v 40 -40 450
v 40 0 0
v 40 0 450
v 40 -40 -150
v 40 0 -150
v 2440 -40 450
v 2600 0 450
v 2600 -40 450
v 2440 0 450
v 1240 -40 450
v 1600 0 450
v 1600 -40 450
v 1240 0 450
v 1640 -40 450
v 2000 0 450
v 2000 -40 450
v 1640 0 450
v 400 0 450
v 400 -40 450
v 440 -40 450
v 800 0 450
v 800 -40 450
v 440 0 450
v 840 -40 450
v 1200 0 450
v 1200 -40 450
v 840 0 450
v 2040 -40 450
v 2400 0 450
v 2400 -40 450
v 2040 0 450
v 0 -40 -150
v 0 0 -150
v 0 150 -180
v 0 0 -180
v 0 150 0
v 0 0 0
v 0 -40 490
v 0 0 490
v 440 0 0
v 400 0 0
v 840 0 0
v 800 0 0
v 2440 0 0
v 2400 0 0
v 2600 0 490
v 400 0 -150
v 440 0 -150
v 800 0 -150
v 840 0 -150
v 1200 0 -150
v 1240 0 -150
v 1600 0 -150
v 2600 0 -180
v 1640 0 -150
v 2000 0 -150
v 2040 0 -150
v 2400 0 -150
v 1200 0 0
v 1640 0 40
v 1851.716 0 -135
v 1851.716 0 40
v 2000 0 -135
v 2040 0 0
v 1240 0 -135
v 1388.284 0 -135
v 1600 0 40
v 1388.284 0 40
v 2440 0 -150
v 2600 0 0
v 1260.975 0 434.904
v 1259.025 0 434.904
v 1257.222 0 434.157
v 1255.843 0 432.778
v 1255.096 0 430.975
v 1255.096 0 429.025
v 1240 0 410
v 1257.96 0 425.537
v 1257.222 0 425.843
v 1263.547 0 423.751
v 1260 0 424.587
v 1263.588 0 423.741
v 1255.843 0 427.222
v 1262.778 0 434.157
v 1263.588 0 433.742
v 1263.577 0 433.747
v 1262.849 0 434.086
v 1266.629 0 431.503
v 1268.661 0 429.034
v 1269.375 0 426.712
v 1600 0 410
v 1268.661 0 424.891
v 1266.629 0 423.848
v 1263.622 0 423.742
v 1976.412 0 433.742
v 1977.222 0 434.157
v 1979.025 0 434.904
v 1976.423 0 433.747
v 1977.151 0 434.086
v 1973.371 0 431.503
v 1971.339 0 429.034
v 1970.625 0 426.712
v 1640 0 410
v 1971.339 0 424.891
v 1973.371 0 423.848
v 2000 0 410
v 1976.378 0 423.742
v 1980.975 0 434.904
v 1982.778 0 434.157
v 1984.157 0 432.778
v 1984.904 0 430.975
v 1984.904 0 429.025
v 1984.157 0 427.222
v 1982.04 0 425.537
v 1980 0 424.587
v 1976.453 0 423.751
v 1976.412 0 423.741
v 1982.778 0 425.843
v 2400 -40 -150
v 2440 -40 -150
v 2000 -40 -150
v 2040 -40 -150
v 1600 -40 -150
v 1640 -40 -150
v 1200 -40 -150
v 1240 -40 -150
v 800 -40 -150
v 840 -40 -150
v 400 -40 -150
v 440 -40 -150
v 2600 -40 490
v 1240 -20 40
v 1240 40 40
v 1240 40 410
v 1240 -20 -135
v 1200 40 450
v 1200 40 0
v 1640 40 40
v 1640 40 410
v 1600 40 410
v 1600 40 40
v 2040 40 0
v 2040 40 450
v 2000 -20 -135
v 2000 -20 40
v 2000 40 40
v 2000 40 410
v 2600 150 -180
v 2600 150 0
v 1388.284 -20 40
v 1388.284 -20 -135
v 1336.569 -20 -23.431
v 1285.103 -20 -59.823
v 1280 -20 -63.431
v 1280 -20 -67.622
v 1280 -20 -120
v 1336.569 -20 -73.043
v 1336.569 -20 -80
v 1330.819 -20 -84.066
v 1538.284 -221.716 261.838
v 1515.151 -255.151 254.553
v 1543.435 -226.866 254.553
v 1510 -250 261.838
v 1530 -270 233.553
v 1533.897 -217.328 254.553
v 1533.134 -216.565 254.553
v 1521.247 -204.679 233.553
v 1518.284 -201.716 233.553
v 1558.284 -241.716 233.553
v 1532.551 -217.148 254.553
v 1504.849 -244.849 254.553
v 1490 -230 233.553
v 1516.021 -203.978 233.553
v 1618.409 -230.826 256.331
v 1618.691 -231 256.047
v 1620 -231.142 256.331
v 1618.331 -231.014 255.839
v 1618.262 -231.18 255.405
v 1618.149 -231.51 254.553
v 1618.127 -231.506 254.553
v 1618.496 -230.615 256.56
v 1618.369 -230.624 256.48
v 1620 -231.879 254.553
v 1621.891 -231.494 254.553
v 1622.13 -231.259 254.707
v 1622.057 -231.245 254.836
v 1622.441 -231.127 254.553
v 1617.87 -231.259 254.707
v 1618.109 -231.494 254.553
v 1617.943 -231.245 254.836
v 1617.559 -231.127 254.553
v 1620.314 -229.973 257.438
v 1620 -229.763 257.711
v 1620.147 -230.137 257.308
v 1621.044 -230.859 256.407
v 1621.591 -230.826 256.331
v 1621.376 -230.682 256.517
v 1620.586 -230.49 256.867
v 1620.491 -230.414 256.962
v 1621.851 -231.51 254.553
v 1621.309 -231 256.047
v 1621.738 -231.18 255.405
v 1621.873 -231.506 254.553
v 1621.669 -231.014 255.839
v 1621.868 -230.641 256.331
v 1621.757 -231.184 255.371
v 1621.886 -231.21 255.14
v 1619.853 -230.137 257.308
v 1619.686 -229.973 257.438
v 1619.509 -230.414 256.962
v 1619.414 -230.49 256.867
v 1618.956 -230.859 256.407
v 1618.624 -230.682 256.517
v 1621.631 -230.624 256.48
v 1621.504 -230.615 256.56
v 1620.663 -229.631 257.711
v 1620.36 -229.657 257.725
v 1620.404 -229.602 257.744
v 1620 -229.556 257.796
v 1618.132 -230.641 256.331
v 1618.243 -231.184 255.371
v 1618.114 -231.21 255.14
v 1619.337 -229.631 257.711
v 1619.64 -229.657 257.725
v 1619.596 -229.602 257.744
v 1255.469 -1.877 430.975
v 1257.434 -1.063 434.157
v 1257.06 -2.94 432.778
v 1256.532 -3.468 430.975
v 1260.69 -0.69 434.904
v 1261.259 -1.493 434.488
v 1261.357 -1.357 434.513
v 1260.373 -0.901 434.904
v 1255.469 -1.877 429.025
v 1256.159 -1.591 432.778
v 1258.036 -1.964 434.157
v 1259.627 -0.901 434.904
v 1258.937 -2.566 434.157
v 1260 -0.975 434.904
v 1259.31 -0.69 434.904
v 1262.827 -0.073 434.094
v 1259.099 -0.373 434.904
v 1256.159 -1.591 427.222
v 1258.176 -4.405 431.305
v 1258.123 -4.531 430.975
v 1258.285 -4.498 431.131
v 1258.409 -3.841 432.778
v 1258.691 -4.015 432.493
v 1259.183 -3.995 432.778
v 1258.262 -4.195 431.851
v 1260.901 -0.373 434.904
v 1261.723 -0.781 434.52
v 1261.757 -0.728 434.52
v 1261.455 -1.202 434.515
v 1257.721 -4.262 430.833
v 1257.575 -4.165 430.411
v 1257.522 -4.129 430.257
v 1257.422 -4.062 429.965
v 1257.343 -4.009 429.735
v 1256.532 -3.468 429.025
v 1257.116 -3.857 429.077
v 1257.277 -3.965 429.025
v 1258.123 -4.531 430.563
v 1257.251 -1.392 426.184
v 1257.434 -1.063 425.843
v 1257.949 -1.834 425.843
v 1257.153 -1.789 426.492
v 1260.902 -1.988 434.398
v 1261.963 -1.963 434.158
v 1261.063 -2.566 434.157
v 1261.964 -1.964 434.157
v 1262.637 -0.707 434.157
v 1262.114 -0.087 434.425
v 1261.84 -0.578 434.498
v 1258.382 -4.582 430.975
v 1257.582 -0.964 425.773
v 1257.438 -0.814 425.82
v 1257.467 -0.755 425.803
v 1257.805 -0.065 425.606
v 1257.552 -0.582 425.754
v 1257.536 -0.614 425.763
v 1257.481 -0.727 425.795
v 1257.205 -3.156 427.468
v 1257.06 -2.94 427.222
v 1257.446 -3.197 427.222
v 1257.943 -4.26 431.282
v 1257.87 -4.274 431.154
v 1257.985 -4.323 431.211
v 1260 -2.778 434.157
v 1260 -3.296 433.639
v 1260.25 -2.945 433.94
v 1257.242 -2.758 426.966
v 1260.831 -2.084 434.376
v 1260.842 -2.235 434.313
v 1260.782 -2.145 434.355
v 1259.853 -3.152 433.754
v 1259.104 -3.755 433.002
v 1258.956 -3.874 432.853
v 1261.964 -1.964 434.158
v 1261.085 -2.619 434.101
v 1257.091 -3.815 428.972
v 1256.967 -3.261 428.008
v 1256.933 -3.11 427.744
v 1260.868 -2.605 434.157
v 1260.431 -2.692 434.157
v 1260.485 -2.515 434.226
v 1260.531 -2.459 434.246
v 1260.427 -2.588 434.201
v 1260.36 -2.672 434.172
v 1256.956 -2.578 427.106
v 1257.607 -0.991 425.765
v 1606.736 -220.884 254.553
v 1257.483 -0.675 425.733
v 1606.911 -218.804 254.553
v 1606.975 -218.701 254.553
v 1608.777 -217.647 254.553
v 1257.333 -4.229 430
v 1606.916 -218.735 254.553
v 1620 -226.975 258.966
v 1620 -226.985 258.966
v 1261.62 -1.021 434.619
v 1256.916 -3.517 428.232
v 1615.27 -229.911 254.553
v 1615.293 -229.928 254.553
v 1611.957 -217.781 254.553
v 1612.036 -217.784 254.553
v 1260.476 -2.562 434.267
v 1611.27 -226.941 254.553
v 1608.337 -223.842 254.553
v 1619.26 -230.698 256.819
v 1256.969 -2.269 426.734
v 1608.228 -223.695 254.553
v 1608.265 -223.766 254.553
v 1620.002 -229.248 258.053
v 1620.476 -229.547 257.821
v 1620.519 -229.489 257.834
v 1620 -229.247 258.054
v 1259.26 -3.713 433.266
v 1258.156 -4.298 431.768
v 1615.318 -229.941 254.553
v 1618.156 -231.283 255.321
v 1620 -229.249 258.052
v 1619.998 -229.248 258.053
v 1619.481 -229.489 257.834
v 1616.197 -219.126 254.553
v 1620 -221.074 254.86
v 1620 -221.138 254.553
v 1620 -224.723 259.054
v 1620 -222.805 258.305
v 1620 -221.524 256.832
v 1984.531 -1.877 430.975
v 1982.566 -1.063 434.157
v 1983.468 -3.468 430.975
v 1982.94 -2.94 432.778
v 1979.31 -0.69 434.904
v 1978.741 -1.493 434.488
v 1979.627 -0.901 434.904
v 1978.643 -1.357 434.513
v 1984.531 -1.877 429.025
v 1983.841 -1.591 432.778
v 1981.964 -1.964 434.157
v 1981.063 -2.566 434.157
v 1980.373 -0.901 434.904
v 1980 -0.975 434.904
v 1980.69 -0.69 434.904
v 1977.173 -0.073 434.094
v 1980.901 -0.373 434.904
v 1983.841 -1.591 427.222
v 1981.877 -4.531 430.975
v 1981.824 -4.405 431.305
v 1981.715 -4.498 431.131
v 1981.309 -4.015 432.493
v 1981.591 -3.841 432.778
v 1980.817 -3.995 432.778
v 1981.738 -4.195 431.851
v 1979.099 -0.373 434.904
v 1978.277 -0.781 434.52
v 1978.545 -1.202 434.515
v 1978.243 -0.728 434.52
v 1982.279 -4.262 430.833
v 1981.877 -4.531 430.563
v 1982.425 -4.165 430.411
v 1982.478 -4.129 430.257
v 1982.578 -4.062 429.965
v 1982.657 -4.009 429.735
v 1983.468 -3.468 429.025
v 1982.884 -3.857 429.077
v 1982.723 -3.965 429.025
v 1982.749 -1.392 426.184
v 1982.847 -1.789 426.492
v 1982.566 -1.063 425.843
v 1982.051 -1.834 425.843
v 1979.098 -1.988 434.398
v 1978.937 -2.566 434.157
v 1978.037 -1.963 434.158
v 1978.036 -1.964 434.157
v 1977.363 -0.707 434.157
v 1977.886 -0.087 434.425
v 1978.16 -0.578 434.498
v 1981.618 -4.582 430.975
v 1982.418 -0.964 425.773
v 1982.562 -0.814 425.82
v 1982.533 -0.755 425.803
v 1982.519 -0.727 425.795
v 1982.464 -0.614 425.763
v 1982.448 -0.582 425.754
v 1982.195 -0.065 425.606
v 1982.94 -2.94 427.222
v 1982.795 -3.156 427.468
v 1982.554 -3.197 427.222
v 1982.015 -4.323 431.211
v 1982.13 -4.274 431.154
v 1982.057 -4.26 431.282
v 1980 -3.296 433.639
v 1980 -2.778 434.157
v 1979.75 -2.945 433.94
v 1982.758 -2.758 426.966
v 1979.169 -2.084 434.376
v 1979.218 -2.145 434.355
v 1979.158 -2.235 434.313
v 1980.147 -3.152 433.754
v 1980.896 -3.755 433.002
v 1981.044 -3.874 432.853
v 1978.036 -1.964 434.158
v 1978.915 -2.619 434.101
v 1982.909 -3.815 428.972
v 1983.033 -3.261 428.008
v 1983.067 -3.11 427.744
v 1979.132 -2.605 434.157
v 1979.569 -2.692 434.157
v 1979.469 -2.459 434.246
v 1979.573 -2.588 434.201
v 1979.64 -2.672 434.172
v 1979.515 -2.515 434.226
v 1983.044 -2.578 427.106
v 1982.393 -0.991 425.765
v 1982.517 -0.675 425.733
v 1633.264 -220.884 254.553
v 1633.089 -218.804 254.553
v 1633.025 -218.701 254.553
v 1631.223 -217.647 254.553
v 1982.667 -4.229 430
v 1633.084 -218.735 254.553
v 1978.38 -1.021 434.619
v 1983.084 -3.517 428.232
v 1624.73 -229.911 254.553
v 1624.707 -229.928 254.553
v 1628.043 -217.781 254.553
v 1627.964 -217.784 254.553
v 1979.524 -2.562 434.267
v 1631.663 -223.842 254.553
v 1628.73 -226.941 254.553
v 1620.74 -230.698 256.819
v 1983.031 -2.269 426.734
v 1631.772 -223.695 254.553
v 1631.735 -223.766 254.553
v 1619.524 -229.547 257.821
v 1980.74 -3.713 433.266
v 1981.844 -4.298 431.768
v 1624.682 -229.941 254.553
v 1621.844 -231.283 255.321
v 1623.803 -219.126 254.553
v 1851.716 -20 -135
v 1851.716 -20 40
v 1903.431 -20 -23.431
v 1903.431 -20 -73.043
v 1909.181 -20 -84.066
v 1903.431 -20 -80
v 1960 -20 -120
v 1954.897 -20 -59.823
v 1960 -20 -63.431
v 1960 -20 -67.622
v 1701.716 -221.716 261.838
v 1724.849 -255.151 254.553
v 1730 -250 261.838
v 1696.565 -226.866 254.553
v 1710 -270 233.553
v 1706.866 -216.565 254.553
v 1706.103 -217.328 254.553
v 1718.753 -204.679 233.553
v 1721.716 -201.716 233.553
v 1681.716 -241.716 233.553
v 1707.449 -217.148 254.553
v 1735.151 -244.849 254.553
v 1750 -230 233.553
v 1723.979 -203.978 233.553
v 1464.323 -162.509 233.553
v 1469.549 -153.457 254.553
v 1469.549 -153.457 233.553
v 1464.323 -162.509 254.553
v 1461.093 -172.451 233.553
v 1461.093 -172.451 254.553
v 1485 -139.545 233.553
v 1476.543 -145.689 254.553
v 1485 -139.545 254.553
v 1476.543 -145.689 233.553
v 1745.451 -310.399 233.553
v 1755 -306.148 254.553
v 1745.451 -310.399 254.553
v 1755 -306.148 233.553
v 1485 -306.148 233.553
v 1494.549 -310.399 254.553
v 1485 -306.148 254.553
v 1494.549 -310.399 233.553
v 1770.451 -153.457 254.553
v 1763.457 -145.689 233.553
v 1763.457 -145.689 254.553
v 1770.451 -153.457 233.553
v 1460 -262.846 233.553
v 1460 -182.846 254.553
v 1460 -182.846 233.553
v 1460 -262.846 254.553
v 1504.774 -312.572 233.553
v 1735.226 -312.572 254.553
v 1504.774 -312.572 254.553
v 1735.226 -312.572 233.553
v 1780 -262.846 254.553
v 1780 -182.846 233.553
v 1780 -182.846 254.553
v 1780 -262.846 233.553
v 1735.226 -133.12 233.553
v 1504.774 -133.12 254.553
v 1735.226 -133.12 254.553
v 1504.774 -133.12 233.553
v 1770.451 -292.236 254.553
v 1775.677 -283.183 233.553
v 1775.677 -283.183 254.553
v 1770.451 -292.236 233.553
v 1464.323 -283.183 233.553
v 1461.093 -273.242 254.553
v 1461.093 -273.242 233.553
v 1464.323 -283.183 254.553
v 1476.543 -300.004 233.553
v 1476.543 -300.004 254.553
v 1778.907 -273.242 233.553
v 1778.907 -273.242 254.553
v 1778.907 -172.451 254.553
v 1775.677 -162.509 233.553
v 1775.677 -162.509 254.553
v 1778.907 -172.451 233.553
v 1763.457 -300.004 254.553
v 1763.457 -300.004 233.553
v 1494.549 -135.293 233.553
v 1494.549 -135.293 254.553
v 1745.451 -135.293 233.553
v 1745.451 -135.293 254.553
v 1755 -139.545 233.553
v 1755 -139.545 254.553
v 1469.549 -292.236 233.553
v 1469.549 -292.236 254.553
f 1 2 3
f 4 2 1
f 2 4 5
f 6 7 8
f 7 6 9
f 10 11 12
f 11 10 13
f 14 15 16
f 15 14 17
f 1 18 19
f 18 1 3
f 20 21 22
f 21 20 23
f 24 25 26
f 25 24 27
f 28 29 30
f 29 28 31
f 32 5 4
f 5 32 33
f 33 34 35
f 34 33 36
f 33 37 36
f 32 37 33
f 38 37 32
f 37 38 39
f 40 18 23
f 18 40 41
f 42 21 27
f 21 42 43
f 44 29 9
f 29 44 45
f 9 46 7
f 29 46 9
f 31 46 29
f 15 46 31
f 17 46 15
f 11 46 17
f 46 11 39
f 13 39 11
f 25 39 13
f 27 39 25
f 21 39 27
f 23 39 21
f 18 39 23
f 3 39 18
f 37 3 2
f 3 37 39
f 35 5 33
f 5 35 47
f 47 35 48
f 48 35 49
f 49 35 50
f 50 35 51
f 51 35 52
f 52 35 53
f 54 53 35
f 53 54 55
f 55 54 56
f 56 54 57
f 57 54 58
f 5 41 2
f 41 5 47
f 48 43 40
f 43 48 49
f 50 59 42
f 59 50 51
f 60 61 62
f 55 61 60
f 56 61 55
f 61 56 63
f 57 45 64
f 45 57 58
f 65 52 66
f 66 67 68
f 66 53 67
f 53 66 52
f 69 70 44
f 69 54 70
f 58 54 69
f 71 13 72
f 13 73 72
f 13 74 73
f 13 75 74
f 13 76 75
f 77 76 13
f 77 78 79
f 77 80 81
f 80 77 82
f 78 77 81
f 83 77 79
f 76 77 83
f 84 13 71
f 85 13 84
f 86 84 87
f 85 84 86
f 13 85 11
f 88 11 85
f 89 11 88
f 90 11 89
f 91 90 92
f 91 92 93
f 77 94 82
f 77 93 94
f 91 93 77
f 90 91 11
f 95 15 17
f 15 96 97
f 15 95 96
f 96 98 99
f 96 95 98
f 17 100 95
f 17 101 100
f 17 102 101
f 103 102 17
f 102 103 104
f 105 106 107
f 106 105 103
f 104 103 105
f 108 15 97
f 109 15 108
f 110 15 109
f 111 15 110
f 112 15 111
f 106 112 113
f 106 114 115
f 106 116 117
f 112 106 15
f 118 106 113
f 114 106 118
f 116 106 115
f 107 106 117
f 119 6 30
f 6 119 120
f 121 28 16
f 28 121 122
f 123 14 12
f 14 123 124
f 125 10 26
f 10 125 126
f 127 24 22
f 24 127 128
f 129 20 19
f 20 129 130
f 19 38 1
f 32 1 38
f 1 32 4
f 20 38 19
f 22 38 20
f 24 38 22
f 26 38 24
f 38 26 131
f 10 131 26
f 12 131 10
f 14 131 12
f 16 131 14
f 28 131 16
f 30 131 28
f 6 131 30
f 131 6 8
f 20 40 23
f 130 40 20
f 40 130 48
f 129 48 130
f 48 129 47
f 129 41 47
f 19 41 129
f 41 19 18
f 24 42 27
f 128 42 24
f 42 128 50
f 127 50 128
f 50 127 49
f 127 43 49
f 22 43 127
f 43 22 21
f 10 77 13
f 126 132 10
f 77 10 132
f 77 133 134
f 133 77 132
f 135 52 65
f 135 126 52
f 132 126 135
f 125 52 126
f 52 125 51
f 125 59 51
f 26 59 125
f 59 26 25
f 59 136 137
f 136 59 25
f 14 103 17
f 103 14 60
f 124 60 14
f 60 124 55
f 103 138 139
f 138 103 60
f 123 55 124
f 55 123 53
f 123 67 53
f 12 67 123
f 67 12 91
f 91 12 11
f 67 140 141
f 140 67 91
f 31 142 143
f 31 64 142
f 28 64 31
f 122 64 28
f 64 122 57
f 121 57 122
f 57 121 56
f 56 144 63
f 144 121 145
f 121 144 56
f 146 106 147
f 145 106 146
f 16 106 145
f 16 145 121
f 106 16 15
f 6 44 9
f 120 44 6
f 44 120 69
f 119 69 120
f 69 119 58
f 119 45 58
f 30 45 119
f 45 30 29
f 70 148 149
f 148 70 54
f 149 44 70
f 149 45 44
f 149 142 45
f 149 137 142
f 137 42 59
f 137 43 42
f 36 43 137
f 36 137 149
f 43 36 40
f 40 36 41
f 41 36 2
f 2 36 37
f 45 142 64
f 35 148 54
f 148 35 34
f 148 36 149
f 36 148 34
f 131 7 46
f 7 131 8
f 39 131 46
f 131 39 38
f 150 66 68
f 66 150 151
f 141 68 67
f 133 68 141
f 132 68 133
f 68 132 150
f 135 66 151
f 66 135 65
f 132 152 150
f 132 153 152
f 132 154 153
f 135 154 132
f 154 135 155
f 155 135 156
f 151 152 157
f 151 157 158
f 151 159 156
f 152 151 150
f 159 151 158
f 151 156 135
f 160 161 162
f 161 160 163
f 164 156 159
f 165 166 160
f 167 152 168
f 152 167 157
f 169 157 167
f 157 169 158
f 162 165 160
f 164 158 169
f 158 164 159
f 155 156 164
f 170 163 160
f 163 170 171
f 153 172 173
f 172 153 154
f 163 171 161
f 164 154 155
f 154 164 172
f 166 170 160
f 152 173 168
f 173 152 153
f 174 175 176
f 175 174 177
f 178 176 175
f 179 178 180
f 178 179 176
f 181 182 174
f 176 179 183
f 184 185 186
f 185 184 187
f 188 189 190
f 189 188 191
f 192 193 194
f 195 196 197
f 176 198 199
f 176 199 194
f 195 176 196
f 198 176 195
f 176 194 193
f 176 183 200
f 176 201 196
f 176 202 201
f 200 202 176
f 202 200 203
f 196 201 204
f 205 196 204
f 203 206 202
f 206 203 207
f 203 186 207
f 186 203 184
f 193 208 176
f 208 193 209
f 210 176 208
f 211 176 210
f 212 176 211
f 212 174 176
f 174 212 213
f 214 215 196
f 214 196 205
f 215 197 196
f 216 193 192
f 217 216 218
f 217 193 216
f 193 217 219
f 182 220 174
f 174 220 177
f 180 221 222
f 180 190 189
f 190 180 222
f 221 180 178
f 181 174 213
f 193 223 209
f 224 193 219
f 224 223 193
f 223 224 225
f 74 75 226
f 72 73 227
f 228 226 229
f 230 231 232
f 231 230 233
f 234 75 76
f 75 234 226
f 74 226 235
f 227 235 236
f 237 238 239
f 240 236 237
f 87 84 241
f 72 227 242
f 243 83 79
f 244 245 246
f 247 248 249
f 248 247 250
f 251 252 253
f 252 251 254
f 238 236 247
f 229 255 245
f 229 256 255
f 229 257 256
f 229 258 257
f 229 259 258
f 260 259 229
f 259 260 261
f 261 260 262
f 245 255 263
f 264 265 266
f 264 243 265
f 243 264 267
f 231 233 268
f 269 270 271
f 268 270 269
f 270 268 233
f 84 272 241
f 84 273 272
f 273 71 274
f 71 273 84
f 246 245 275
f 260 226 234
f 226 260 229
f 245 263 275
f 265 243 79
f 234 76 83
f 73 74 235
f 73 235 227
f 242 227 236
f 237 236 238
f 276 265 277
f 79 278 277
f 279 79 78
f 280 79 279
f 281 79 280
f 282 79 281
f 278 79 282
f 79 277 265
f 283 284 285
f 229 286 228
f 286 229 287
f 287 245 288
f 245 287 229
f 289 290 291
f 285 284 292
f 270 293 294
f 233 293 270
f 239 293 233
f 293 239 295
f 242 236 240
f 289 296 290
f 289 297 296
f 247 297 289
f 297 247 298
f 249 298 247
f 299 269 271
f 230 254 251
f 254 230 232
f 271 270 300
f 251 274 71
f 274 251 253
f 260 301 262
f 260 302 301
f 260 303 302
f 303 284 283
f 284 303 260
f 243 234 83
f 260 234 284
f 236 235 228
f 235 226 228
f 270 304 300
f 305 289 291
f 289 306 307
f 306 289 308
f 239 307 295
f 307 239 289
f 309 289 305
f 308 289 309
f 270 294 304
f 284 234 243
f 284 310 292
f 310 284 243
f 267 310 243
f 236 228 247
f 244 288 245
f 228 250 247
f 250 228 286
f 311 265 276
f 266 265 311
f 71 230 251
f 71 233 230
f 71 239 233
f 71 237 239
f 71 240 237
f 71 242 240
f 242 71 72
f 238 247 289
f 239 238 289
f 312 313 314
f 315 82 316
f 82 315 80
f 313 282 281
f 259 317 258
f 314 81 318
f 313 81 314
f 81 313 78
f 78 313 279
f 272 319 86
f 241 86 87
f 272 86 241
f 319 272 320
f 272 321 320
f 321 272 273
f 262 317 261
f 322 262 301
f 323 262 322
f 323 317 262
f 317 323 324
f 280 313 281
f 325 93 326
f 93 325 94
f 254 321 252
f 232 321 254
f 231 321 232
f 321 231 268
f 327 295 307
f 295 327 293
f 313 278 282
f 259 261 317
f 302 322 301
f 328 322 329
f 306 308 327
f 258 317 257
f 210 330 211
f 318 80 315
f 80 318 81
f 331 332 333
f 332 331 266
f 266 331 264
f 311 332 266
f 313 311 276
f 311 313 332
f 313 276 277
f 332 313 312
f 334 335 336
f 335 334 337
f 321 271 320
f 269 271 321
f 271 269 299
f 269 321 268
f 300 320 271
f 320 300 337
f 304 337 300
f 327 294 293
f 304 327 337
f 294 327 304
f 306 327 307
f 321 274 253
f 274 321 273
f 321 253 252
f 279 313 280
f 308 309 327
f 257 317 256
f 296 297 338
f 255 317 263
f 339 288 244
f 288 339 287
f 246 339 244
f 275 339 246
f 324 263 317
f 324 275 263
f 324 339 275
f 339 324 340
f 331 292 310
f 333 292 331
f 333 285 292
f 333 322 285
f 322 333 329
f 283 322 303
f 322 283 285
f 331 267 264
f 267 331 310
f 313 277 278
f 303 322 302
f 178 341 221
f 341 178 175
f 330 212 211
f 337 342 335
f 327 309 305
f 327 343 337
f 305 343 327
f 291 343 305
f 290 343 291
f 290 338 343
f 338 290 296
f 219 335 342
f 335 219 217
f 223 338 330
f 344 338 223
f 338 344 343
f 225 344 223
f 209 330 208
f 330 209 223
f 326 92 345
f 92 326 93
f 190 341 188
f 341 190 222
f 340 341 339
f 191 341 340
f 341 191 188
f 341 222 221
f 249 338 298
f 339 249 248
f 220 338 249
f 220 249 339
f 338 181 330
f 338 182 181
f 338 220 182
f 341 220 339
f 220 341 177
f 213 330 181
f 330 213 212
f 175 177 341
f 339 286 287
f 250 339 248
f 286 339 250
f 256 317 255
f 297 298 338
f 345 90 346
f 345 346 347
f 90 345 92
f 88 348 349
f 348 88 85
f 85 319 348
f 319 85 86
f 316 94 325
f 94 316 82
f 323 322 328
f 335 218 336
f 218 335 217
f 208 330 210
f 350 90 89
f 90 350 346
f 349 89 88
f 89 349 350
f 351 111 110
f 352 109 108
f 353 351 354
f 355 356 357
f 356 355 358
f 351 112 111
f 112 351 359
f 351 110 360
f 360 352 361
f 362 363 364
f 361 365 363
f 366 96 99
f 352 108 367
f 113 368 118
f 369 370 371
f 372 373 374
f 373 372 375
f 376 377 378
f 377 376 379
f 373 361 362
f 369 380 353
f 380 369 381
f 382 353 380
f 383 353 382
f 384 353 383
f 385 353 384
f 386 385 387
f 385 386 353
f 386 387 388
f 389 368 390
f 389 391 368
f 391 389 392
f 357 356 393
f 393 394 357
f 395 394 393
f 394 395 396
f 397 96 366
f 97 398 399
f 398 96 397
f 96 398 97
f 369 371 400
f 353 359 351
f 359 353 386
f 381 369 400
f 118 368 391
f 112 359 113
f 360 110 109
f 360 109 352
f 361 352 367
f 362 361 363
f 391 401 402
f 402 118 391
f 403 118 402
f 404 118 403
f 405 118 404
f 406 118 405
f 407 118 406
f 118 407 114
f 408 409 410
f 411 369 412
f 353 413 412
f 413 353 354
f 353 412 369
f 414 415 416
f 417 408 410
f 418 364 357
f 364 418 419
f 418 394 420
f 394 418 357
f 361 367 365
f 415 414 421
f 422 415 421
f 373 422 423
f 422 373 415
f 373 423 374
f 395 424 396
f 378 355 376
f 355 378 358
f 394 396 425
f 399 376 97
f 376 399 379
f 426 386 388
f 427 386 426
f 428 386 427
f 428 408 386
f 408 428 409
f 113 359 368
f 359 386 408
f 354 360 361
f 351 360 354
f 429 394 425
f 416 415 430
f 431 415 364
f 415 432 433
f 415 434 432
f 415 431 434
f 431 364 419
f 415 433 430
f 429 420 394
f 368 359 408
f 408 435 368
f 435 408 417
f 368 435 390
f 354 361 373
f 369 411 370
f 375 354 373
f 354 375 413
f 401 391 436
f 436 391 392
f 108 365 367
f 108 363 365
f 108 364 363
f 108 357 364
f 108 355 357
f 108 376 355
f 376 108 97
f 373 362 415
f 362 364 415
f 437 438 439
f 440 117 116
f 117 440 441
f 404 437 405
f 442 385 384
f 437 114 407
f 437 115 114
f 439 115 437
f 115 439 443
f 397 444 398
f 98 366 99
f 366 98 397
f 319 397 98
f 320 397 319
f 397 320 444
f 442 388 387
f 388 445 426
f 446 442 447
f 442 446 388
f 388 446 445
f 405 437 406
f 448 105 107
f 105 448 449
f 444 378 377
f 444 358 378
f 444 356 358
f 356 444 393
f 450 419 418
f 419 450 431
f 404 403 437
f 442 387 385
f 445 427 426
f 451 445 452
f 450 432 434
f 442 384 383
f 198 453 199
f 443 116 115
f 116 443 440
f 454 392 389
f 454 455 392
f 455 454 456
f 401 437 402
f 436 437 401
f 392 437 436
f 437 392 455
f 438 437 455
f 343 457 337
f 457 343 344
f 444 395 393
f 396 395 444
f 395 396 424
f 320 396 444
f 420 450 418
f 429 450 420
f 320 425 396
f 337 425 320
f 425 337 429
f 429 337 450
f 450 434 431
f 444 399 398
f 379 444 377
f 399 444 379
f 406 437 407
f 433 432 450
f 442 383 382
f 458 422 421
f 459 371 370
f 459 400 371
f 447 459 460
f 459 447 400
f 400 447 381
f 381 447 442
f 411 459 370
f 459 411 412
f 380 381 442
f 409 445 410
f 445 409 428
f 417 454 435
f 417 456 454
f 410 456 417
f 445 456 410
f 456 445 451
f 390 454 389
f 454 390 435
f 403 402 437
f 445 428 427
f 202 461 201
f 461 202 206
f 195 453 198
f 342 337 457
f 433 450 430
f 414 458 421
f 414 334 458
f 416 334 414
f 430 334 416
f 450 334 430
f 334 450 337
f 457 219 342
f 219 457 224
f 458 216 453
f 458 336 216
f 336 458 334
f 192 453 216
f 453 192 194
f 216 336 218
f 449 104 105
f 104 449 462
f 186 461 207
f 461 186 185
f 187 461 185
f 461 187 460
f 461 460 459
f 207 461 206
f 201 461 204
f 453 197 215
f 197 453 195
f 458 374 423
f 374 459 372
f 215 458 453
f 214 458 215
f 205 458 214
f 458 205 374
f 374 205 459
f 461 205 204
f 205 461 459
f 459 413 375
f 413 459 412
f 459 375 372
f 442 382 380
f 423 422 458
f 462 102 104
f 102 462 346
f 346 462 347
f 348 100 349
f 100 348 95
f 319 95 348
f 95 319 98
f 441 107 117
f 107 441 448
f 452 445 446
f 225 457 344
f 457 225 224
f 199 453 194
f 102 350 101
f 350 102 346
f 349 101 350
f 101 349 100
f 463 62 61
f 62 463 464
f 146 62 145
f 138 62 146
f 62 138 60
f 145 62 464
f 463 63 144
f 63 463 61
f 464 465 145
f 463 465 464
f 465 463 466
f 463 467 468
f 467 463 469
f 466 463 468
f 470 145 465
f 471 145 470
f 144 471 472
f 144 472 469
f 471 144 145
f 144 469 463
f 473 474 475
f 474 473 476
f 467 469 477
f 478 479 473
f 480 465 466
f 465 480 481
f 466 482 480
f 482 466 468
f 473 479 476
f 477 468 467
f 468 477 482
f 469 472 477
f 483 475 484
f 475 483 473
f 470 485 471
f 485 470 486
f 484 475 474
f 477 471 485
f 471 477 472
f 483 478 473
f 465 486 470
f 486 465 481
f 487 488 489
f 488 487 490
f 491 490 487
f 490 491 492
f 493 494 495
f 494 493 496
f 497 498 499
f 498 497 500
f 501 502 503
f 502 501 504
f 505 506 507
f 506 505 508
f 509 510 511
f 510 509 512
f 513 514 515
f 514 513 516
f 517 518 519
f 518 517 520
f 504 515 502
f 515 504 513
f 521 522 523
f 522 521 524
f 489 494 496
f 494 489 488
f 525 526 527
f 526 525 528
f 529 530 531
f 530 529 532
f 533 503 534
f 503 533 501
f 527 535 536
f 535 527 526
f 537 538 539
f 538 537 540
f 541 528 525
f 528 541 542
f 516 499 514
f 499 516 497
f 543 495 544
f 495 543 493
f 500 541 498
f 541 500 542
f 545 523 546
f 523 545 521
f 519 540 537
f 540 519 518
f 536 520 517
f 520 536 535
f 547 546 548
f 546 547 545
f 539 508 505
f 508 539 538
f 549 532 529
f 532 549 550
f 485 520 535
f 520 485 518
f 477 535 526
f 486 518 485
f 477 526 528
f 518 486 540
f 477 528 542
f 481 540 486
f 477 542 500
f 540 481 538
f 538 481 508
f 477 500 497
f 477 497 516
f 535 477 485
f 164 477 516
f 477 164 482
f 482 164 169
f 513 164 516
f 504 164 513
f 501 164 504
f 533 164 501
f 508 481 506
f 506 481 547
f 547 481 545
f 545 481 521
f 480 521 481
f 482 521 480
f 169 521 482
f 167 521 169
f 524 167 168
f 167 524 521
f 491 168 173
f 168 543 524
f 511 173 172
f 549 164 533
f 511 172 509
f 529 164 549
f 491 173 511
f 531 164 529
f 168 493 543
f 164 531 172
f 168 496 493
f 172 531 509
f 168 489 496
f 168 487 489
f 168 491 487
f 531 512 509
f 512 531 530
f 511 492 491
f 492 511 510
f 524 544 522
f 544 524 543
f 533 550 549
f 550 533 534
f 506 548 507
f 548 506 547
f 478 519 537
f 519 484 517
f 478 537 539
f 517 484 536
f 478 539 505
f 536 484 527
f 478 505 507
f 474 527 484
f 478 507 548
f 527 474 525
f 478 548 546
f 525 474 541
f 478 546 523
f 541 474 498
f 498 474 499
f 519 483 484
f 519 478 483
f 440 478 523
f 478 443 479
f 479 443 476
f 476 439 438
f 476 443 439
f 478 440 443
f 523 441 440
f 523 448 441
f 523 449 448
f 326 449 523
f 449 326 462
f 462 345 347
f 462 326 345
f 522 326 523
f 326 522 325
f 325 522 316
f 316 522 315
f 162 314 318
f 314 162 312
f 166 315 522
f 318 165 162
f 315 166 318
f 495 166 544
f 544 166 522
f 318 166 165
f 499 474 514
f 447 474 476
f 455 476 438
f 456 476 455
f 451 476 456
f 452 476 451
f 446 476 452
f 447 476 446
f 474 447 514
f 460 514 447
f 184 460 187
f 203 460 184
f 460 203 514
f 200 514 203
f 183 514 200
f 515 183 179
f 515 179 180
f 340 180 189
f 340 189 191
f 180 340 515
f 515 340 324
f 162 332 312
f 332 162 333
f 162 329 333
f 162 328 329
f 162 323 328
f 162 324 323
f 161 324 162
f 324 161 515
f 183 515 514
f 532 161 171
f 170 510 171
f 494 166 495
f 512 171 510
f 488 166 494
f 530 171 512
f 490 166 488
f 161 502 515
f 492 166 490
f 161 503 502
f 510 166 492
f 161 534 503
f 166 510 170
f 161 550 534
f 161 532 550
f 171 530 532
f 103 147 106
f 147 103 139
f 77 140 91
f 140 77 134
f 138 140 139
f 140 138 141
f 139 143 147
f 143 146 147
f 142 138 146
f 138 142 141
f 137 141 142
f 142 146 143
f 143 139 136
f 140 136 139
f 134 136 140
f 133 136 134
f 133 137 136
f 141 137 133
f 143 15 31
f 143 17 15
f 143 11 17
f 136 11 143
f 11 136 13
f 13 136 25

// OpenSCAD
galeria_tarto_szama = 6 ;
galeria_tarto_szelessege = 40 ; 
galeria_tarto_vastassaga = 40 ; 
galeria_tarto_magassaga = 600 ; 
galeria_tarto_arasz = 400 ;   
galeria_tarto_gerendaba = 150 ;

fo_gerenda_szelessege = galeria_tarto_szama * galeria_tarto_arasz + galeria_tarto_szelessege * 5 ;
fo_gerenda_vastassaga = 150 ;
fo_gerenda_magassaga = 180 ;

galeria_felso_bar_szelessege = fo_gerenda_szelessege ; 
galeria_felso_bar_vastassaga = galeria_tarto_vastassaga ; 
galeria_felso_bar_magassaga = galeria_felso_bar_vastassaga ; 

kapcsolato_deszka_szelessege = 320 ;
kapcsolato_deszka_vastassaga = 180 ;
kapcsolato_deszka_magassaga = 20 ;
kapcsolato_deszka_sarok_radiusz = 50 ;

lab_atmeroje = 40 ;
lab_hossza = 500 ;
lab_tavolsag_tartora = 60 ;
lab_alsobb_pontja = -120 ;

tamogatasi_deszka_szelessege = 2 * lab_tavolsag_tartora + lab_atmeroje * cos( 45 ) ;
tamogatasi_deszka_vastassaga = 20 ;
tamogatasi_deszka_magassaga = 175 ;

tamogato_elso_tarto = 4 ;
// A támagató szimmetriája miatt csálni kell egy kicsit.
tamotago_tavolsag_falrol = tamogato_elso_tarto * galeria_tarto_arasz + galeria_tarto_szelessege / 2 ;
keret_tavolsag_falrol = ( tamogato_elso_tarto - 1 ) * galeria_tarto_arasz ;

keret_also_bar_szelessege = galeria_tarto_arasz * 2 + galeria_tarto_szelessege ;
keret_also_bar_vastassaga = 40 ;
keret_also_bar_magassaga = 40 ;

keret_felso_bar_szelessege = keret_also_bar_szelessege ;
keret_felso_bar_vastassaga = keret_also_bar_vastassaga ;
keret_felso_bar_magassaga = keret_also_bar_magassaga ;

keret_osszes_magassaga = galeria_tarto_magassaga - galeria_tarto_gerendaba ;

keret_fuggoleges_bar_szelessege = galeria_tarto_szelessege ;
keret_fuggoleges_bar_vastassaga = keret_also_bar_vastassaga ;
keret_fuggoleges_bar_magassaga = keret_osszes_magassaga - keret_also_bar_magassaga - keret_felso_bar_magassaga ;


deszka_szine = [ 0.1, 0.4, 0.6, 0.9 ] ;
lanc_szine = [ 0.6, 0.6, 0.6, 0.6 ] ;
galeria_szine = [ 0.5, 0.5, 0, 0.6 ] ;
keret_szine = [ 0.2, 0.2, 0.4, 0.8 ] ;
lab_szine = [ 0.5, 0.3, 0.5, 0.8 ] ;

galeria() ;

translate( [ tamotago_tavolsag_falrol, 0, 0 ] ) {
  tamagato() ;
  keret() ;
}

// ==============
// A többi module
// ==============

module galeria() {
  color( galeria_szine ) {

    for( i = [ 0 : galeria_tarto_szama ] ) 
      translate( [ i * galeria_tarto_arasz, - galeria_tarto_vastassaga, - galeria_tarto_gerendaba ] )
        cube( size = [ galeria_tarto_szelessege, galeria_tarto_vastassaga, galeria_tarto_magassaga ] ) ;

    translate( [ 0, 0, - fo_gerenda_magassaga ] )
      cube( [ fo_gerenda_szelessege, fo_gerenda_vastassaga, fo_gerenda_magassaga ] ) ;
  
    translate( [ 0, - galeria_felso_bar_vastassaga, galeria_tarto_magassaga - galeria_tarto_gerendaba ] )
      cube( [ galeria_felso_bar_szelessege, galeria_felso_bar_vastassaga, galeria_felso_bar_magassaga] ) ;
  }
}


/*
 * A x0 a keret központja.
 */
module keret() {
  color( keret_szine )
    translate( [ - keret_also_bar_szelessege / 2, 0, 0 ] ) {
      cube( [ keret_also_bar_szelessege , keret_also_bar_vastassaga, keret_also_bar_magassaga ] ) ;
      translate( [ 0, 0, keret_osszes_magassaga - keret_felso_bar_vastassaga ] )
        cube( [ keret_felso_bar_szelessege , keret_felso_bar_vastassaga, keret_felso_bar_magassaga ] ) ;
      for( i = [ 0 : 2 ] ) 
        translate( [ i * galeria_tarto_arasz, 0, keret_also_bar_magassaga ] )
          cube( [ keret_fuggoleges_bar_szelessege, keret_fuggoleges_bar_vastassaga, keret_fuggoleges_bar_magassaga ] ) ;
    }
}

/*
 * A x0 a támagató központja.
 */
module tamagato() {
  tamagato_fele() ;
  keret_tamagato_egy_hura() ;
  mirror( [ 1, 0, 0 ] ) {
    tamagato_fele() ;  
    keret_tamagato_egy_hura() ;
  }
  translate( [ 0, - lab_hossza * cos( 45 ) + lab_atmeroje + sin( 45 ), lab_hossza * sin( 45 ) + lab_alsobb_pontja ] )
     kapcsolato_deszka() ;
}


module tamagato_fele() {
  
  alap_eltolas = - galeria_tarto_arasz + galeria_tarto_szelessege / 2 ;
   
  translate( [ alap_eltolas, 0, 0 ] )
    tamogatasi_deszka() ; 
  
  translate( [ alap_eltolas - lab_atmeroje / 2 + lab_tavolsag_tartora, -  tamogatasi_deszka_vastassaga, lab_alsobb_pontja ] )
    lab() ;

  module tamogatasi_deszka() {
    color( deszka_szine )
      translate( [ 0, - tamogatasi_deszka_vastassaga, keret_also_bar_magassaga - tamogatasi_deszka_magassaga ] )
        cube( size = [ tamogatasi_deszka_szelessege, tamogatasi_deszka_vastassaga, tamogatasi_deszka_magassaga ] ) ;
}
  
  module lab() {
    // Multimatrix-xal lehetne a nyírás, de ezzel már nem lenne pontos 
    // a láb átmerője.
    color( lab_szine ) 
      //translate( [ - lab_atmeroje / 2, 0, 0 ] )
        rotate( [ 45, 0, 45 ] )
          cube( size = [ lab_atmeroje, lab_atmeroje, lab_hossza ]  ) ;  
  
  }
  
}

module kapcsolato_deszka() {

  color( deszka_szine )  
    // X-os eredet a központon.
    translate( [ - kapcsolato_deszka_szelessege / 2, 0, 0 ] )
//        cube( [ kapcsolato_deszka_szelessege, kapcsolato_deszka_vastassaga, kapcsolato_deszka_magassaga ] ) ;
      translate( [ kapcsolato_deszka_sarok_radiusz, kapcsolato_deszka_sarok_radiusz, 0 ] )
        minkowski() {
          cube( [ kapcsolato_deszka_szelessege - 2 * kapcsolato_deszka_sarok_radiusz,kapcsolato_deszka_vastassaga - 2 * kapcsolato_deszka_sarok_radiusz,kapcsolato_deszka_magassaga ] ) ;
          cylinder( r = kapcsolato_deszka_sarok_radiusz, h = 1 ) ;
  }
}


module keret_tamagato_egy_hura() {
  
  hur( eleje = [ 
          0, 
          - lab_hossza * cos( 45 ) + 2 * lab_atmeroje * sin( 45 ) + kapcsolato_deszka_vastassaga / 2 - tamogatasi_deszka_vastassaga, 
          lab_hossza * sin( 45 ) + kapcsolato_deszka_magassaga  + lab_alsobb_pontja
      ], 
      vege = [ 
          ( - keret_felso_bar_szelessege / 2 ) + ( keret_fuggoleges_bar_szelessege * 1.5 ), 
          0, 
          keret_osszes_magassaga - keret_felso_bar_magassaga / 2
      ], 
      radiusz_eleje = 5,
      radiusz_vege = 5,
      szin = [ 0.7, 0.7, 0.7, 0.7 ],
      gomb = true  
  ) ;   
}


module hur( eleje, vege, radiusz_eleje = 20, radiusz_vege = 10, szin = [ 0.7, 0.7, 0.7, 0.6 ], gomb = true ) {
  
  vektor = vektor( eleje, vege ) ;

  // https://en.wikibooks.org/wiki/OpenSCAD_User_Manual/The_OpenSCAD_Language#rotate
  
  hossz = norm( vektor ) ;
  
  b = acos( vektor[ 2 ] / hossz ) ; 
  c = atan2( vektor[ 1 ], vektor[ 0 ] ) ;
  
  color( szin )
    translate( eleje ) 
      rotate( [ 0, b, c ] )
        translate( [ 0, 0, hossz / 2 ] )
          cylinder( hossz, radiusz_eleje, radiusz_vege, true ) ;
  
  if( gomb ) {
    color( "blue" ) 
      translate( eleje )
        sphere( radiusz_eleje ) ;

    color( "red" ) 
      translate( vege )
        sphere( radiusz_vege ) ;
  }

}

function vektor( eleje, vege ) = 
  [ vege[ 0 ] - eleje[ 0 ], vege[ 1 ] - eleje[ 1 ], vege[ 2 ] - eleje[ 2 ] ]
;


*hur( [ 100, 100, -100 ], [ 300, 400, -500 ] ) ;
